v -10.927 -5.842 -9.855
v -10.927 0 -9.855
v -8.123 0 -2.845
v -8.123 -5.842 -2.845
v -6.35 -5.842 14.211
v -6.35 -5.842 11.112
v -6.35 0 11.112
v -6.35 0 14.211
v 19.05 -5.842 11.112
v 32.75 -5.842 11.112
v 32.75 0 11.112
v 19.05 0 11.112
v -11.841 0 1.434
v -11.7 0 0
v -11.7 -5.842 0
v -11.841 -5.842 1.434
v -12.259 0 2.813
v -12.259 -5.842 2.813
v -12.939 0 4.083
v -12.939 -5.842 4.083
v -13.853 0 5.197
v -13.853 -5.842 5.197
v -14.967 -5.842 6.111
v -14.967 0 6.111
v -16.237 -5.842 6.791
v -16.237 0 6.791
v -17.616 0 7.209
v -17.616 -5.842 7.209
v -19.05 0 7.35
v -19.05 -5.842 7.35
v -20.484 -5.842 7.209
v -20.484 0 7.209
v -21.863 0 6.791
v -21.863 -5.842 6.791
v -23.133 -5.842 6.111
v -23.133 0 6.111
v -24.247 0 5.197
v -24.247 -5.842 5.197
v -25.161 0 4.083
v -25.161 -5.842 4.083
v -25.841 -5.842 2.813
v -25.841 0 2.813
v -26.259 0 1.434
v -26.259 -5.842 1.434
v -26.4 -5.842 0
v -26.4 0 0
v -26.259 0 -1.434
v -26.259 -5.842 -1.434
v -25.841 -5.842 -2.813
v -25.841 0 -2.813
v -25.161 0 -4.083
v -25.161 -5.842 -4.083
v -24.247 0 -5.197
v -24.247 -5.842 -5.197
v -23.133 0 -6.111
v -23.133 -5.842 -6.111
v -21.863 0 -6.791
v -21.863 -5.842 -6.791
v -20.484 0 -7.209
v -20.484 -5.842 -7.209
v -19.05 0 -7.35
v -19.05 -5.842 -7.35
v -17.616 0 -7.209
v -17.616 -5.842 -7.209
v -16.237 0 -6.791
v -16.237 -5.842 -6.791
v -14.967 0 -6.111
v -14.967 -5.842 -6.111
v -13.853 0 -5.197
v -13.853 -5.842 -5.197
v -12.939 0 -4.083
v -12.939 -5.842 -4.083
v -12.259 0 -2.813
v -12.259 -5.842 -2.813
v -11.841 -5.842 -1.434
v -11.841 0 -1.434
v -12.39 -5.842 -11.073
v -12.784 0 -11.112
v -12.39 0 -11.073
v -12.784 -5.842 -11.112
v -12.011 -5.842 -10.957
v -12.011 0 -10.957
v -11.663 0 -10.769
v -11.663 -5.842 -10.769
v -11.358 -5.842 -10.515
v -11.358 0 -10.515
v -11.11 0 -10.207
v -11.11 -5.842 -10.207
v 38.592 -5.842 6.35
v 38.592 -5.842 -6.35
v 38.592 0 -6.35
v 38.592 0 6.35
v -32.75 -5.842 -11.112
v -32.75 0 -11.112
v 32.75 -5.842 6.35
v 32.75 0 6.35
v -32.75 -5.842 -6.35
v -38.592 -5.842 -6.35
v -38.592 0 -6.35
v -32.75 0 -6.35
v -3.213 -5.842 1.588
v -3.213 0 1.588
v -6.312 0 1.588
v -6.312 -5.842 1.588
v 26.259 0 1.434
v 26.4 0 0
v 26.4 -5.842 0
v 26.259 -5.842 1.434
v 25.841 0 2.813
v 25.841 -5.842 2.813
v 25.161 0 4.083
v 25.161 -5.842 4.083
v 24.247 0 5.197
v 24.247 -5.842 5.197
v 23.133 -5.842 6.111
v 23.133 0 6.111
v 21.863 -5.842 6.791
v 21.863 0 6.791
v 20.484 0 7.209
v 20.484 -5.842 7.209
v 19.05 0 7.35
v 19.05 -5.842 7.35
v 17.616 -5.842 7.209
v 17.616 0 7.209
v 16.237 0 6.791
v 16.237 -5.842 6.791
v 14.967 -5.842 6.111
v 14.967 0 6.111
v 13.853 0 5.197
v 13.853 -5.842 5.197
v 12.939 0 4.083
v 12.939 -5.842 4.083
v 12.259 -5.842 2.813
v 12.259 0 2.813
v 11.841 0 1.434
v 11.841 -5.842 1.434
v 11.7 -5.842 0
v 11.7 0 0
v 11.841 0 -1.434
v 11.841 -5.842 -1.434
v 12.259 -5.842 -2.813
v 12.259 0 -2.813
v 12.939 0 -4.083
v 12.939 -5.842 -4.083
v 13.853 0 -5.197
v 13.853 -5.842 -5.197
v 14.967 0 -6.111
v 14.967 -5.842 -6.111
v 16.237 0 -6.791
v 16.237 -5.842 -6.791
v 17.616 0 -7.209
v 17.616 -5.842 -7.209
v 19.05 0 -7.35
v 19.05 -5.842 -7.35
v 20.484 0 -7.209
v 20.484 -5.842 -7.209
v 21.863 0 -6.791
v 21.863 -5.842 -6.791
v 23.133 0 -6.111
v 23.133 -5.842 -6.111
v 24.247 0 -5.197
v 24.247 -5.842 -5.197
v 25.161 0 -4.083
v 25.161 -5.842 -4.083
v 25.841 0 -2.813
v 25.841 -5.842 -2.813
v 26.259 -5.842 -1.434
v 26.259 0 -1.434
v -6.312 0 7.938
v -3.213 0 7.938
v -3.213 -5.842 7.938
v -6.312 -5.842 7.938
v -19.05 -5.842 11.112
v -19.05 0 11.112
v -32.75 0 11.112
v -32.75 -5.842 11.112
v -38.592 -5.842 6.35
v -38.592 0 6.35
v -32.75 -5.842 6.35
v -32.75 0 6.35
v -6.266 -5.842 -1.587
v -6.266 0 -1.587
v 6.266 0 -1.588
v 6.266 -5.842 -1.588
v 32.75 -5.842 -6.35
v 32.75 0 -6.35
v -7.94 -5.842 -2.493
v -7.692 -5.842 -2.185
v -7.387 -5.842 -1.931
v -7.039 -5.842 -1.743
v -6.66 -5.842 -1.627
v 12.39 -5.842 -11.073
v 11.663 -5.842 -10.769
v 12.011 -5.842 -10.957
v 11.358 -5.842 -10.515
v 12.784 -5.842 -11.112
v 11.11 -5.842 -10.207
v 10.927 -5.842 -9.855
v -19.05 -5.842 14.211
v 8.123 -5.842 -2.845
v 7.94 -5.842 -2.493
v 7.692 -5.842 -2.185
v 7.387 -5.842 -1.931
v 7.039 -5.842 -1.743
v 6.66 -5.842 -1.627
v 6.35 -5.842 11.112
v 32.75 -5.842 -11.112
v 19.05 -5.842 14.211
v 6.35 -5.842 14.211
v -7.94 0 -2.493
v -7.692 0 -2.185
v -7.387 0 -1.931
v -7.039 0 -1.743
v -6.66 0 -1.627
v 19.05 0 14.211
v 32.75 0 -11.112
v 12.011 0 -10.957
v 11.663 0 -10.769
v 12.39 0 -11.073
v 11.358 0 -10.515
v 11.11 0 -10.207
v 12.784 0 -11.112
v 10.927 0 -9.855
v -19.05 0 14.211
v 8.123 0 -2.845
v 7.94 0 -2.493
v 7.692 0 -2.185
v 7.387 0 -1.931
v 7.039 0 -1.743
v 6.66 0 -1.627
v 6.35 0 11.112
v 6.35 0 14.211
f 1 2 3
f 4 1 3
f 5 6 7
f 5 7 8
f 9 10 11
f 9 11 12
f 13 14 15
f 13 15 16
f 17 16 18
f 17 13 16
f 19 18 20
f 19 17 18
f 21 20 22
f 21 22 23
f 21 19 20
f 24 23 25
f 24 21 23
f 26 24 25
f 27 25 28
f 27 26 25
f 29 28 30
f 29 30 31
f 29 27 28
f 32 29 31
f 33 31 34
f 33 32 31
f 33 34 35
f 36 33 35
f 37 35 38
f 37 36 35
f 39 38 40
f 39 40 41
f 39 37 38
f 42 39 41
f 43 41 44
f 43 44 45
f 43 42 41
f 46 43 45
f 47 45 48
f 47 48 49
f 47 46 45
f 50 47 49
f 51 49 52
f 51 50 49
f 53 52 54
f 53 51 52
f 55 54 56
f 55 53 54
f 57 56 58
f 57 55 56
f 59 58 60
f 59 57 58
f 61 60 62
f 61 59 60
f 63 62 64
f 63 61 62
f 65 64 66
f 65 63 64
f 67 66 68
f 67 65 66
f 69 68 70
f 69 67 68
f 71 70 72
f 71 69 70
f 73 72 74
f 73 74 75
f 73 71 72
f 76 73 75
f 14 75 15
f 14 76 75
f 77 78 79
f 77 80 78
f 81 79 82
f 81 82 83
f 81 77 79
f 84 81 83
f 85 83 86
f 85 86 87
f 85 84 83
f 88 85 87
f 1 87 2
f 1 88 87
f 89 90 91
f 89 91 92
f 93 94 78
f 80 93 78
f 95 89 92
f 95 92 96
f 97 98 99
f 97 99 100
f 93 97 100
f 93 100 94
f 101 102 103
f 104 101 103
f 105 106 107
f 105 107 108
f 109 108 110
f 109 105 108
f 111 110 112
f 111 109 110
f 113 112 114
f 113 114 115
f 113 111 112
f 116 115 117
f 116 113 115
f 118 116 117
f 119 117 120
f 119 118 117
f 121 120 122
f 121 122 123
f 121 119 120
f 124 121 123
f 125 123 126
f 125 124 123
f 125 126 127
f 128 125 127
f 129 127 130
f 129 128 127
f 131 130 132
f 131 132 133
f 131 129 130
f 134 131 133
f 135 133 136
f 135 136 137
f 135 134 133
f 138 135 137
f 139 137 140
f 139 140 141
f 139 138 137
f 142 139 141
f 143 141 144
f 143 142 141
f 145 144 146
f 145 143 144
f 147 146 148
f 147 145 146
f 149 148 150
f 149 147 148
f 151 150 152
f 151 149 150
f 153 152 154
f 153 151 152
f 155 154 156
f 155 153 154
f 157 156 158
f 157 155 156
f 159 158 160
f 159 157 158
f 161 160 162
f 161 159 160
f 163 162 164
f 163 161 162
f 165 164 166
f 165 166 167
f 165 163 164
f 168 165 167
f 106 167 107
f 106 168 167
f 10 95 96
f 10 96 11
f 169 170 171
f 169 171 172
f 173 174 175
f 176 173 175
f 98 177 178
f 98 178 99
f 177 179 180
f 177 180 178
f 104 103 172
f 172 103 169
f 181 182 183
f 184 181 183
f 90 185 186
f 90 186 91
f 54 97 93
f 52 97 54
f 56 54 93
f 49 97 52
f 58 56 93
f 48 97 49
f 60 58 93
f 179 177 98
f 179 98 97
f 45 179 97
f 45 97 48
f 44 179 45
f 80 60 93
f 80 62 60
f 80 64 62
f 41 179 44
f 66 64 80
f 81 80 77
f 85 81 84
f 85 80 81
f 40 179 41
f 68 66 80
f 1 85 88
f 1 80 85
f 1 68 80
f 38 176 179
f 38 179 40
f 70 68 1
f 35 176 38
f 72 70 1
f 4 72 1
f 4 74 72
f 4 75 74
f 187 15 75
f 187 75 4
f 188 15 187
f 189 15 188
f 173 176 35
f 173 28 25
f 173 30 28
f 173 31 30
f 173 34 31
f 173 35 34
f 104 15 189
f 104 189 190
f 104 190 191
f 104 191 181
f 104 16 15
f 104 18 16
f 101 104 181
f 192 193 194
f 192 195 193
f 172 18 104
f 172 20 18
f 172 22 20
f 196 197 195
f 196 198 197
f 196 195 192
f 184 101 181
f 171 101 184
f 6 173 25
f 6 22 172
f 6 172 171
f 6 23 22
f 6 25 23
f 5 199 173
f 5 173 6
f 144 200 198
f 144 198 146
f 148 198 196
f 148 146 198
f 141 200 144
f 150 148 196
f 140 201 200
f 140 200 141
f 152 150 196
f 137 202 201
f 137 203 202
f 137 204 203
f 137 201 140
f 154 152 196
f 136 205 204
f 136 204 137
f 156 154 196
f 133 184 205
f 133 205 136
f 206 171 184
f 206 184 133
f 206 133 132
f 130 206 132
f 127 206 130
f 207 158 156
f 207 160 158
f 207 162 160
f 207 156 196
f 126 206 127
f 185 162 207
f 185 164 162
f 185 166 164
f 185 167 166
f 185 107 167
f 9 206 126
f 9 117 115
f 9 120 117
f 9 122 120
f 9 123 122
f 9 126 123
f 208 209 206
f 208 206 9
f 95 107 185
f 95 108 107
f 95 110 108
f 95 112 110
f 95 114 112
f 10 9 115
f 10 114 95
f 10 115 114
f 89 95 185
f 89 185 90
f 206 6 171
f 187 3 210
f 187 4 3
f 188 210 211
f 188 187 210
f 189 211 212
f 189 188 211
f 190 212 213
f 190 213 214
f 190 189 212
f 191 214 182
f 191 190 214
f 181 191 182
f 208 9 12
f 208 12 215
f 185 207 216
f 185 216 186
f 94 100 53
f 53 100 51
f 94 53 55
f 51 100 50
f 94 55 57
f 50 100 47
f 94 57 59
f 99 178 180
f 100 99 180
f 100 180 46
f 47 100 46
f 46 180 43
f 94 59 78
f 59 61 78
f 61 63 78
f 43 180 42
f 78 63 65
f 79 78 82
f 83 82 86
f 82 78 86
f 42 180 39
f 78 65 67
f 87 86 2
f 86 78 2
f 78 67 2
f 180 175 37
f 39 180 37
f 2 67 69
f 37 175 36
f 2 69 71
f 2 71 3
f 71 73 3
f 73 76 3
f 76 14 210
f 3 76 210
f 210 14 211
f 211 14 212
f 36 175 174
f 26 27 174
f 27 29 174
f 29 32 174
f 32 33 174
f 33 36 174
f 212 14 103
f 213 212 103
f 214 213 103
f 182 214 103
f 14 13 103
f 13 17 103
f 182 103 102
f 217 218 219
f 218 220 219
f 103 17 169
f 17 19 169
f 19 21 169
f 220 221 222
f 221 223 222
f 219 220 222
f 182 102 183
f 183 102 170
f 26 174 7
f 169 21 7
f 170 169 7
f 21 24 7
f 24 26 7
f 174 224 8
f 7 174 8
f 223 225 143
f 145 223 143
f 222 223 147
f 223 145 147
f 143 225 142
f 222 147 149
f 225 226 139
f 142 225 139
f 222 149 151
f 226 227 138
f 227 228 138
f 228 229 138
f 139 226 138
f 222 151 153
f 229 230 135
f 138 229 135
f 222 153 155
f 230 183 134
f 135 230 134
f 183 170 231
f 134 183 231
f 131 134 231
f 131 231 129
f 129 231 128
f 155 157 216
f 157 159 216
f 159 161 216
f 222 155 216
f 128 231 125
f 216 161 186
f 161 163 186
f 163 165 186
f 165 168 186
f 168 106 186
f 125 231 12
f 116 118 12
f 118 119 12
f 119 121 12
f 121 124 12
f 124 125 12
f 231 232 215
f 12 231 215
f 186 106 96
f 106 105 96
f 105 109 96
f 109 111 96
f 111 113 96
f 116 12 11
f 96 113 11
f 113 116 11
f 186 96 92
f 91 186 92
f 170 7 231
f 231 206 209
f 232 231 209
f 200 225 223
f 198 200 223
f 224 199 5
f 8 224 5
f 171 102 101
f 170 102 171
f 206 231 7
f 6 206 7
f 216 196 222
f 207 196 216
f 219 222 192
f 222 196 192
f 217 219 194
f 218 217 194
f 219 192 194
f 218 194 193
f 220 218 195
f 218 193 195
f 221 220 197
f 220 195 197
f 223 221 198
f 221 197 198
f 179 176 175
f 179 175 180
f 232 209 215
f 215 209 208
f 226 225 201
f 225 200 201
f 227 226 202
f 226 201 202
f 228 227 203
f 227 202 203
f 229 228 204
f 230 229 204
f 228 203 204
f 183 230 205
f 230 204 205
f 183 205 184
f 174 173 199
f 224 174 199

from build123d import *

# Parameters (mm, degrees)
F0_R     = 7.35
F1_DEPTH = 5.842
F2_R     = 2
F3_W     = 3.0988
F3_H     = 6.35
F4_DEPTH = 25.4
F5_W     = 12.7
F5_H     = 3.0988
F6_DEPTH = 5.842
F8_DEPTH = 5.842


with BuildPart() as f1:
    # F0 (on Front) → F1 (new body)
    with BuildSketch(Plane.XZ):
        Polygon((31.75, 11.1125), (-31.75, 11.1125), (-31.75, -11.1125), (-11.43, -11.1125), (-7.62, -1.5875), (0, -1.5875), (7.62, -1.5875), (11.43, -11.1125), (31.75, -11.1125), align=None)
        with Locations((-19.05, 0)):
            Circle(F0_R, mode=Mode.SUBTRACT)
        with Locations((19.05, 0)):
            Circle(F0_R, mode=Mode.SUBTRACT)
    extrude(amount=F1_DEPTH)

    # F2
    f2_edges = [f1.edges().sort_by_distance(p)[0] for p in [
        (-11.43, -2.921, -11.1125),
        (-7.62, -2.921, -1.5875),
        (7.62, -2.921, -1.5875),
        (11.43, -2.921, -11.1125),
    ]]
    fillet(f2_edges, radius=F2_R)

    # F3 (on face) → F4 (cut)
    with BuildSketch(Plane(origin=(0, 0, 0), x_dir=(-1, 0, 0), z_dir=(0, 1, 0))):
        with Locations((4.7625, 4.7625)):
            Rectangle(F3_W, F3_H)
    extrude(amount=-F4_DEPTH, mode=Mode.SUBTRACT)

    # F5 (on face) → F6 (join, through all)
    with BuildSketch(Plane.XZ.offset(5.842)):
        with Locations((-12.7, 12.6619)):
            Rectangle(F5_W, F5_H)
        with Locations((12.7, 12.6619)):
            Rectangle(F5_W, F5_H)
    extrude(amount=-F6_DEPTH)

    # F7 (on face) → F8 (join, through all)
    with BuildSketch(Plane.XZ.offset(5.842)):
        Polygon((38.592, 6.35), (32.75, 6.35), (32.75, 11.1125), (31.75, 11.1125), (31.75, 6.35), (31.75, -6.35), (31.75, -11.1125), (32.75, -11.1125), (32.75, -6.35), (38.592, -6.35), align=None)
        Polygon((-31.75, 6.35), (-31.75, 11.1125), (-32.75, 11.1125), (-32.75, 6.35), (-38.592, 6.35), (-38.592, -6.35), (-32.75, -6.35), (-32.75, -11.1125), (-31.75, -11.1125), (-31.75, -6.35), align=None)
    extrude(amount=-F8_DEPTH)


solid = f1.part
